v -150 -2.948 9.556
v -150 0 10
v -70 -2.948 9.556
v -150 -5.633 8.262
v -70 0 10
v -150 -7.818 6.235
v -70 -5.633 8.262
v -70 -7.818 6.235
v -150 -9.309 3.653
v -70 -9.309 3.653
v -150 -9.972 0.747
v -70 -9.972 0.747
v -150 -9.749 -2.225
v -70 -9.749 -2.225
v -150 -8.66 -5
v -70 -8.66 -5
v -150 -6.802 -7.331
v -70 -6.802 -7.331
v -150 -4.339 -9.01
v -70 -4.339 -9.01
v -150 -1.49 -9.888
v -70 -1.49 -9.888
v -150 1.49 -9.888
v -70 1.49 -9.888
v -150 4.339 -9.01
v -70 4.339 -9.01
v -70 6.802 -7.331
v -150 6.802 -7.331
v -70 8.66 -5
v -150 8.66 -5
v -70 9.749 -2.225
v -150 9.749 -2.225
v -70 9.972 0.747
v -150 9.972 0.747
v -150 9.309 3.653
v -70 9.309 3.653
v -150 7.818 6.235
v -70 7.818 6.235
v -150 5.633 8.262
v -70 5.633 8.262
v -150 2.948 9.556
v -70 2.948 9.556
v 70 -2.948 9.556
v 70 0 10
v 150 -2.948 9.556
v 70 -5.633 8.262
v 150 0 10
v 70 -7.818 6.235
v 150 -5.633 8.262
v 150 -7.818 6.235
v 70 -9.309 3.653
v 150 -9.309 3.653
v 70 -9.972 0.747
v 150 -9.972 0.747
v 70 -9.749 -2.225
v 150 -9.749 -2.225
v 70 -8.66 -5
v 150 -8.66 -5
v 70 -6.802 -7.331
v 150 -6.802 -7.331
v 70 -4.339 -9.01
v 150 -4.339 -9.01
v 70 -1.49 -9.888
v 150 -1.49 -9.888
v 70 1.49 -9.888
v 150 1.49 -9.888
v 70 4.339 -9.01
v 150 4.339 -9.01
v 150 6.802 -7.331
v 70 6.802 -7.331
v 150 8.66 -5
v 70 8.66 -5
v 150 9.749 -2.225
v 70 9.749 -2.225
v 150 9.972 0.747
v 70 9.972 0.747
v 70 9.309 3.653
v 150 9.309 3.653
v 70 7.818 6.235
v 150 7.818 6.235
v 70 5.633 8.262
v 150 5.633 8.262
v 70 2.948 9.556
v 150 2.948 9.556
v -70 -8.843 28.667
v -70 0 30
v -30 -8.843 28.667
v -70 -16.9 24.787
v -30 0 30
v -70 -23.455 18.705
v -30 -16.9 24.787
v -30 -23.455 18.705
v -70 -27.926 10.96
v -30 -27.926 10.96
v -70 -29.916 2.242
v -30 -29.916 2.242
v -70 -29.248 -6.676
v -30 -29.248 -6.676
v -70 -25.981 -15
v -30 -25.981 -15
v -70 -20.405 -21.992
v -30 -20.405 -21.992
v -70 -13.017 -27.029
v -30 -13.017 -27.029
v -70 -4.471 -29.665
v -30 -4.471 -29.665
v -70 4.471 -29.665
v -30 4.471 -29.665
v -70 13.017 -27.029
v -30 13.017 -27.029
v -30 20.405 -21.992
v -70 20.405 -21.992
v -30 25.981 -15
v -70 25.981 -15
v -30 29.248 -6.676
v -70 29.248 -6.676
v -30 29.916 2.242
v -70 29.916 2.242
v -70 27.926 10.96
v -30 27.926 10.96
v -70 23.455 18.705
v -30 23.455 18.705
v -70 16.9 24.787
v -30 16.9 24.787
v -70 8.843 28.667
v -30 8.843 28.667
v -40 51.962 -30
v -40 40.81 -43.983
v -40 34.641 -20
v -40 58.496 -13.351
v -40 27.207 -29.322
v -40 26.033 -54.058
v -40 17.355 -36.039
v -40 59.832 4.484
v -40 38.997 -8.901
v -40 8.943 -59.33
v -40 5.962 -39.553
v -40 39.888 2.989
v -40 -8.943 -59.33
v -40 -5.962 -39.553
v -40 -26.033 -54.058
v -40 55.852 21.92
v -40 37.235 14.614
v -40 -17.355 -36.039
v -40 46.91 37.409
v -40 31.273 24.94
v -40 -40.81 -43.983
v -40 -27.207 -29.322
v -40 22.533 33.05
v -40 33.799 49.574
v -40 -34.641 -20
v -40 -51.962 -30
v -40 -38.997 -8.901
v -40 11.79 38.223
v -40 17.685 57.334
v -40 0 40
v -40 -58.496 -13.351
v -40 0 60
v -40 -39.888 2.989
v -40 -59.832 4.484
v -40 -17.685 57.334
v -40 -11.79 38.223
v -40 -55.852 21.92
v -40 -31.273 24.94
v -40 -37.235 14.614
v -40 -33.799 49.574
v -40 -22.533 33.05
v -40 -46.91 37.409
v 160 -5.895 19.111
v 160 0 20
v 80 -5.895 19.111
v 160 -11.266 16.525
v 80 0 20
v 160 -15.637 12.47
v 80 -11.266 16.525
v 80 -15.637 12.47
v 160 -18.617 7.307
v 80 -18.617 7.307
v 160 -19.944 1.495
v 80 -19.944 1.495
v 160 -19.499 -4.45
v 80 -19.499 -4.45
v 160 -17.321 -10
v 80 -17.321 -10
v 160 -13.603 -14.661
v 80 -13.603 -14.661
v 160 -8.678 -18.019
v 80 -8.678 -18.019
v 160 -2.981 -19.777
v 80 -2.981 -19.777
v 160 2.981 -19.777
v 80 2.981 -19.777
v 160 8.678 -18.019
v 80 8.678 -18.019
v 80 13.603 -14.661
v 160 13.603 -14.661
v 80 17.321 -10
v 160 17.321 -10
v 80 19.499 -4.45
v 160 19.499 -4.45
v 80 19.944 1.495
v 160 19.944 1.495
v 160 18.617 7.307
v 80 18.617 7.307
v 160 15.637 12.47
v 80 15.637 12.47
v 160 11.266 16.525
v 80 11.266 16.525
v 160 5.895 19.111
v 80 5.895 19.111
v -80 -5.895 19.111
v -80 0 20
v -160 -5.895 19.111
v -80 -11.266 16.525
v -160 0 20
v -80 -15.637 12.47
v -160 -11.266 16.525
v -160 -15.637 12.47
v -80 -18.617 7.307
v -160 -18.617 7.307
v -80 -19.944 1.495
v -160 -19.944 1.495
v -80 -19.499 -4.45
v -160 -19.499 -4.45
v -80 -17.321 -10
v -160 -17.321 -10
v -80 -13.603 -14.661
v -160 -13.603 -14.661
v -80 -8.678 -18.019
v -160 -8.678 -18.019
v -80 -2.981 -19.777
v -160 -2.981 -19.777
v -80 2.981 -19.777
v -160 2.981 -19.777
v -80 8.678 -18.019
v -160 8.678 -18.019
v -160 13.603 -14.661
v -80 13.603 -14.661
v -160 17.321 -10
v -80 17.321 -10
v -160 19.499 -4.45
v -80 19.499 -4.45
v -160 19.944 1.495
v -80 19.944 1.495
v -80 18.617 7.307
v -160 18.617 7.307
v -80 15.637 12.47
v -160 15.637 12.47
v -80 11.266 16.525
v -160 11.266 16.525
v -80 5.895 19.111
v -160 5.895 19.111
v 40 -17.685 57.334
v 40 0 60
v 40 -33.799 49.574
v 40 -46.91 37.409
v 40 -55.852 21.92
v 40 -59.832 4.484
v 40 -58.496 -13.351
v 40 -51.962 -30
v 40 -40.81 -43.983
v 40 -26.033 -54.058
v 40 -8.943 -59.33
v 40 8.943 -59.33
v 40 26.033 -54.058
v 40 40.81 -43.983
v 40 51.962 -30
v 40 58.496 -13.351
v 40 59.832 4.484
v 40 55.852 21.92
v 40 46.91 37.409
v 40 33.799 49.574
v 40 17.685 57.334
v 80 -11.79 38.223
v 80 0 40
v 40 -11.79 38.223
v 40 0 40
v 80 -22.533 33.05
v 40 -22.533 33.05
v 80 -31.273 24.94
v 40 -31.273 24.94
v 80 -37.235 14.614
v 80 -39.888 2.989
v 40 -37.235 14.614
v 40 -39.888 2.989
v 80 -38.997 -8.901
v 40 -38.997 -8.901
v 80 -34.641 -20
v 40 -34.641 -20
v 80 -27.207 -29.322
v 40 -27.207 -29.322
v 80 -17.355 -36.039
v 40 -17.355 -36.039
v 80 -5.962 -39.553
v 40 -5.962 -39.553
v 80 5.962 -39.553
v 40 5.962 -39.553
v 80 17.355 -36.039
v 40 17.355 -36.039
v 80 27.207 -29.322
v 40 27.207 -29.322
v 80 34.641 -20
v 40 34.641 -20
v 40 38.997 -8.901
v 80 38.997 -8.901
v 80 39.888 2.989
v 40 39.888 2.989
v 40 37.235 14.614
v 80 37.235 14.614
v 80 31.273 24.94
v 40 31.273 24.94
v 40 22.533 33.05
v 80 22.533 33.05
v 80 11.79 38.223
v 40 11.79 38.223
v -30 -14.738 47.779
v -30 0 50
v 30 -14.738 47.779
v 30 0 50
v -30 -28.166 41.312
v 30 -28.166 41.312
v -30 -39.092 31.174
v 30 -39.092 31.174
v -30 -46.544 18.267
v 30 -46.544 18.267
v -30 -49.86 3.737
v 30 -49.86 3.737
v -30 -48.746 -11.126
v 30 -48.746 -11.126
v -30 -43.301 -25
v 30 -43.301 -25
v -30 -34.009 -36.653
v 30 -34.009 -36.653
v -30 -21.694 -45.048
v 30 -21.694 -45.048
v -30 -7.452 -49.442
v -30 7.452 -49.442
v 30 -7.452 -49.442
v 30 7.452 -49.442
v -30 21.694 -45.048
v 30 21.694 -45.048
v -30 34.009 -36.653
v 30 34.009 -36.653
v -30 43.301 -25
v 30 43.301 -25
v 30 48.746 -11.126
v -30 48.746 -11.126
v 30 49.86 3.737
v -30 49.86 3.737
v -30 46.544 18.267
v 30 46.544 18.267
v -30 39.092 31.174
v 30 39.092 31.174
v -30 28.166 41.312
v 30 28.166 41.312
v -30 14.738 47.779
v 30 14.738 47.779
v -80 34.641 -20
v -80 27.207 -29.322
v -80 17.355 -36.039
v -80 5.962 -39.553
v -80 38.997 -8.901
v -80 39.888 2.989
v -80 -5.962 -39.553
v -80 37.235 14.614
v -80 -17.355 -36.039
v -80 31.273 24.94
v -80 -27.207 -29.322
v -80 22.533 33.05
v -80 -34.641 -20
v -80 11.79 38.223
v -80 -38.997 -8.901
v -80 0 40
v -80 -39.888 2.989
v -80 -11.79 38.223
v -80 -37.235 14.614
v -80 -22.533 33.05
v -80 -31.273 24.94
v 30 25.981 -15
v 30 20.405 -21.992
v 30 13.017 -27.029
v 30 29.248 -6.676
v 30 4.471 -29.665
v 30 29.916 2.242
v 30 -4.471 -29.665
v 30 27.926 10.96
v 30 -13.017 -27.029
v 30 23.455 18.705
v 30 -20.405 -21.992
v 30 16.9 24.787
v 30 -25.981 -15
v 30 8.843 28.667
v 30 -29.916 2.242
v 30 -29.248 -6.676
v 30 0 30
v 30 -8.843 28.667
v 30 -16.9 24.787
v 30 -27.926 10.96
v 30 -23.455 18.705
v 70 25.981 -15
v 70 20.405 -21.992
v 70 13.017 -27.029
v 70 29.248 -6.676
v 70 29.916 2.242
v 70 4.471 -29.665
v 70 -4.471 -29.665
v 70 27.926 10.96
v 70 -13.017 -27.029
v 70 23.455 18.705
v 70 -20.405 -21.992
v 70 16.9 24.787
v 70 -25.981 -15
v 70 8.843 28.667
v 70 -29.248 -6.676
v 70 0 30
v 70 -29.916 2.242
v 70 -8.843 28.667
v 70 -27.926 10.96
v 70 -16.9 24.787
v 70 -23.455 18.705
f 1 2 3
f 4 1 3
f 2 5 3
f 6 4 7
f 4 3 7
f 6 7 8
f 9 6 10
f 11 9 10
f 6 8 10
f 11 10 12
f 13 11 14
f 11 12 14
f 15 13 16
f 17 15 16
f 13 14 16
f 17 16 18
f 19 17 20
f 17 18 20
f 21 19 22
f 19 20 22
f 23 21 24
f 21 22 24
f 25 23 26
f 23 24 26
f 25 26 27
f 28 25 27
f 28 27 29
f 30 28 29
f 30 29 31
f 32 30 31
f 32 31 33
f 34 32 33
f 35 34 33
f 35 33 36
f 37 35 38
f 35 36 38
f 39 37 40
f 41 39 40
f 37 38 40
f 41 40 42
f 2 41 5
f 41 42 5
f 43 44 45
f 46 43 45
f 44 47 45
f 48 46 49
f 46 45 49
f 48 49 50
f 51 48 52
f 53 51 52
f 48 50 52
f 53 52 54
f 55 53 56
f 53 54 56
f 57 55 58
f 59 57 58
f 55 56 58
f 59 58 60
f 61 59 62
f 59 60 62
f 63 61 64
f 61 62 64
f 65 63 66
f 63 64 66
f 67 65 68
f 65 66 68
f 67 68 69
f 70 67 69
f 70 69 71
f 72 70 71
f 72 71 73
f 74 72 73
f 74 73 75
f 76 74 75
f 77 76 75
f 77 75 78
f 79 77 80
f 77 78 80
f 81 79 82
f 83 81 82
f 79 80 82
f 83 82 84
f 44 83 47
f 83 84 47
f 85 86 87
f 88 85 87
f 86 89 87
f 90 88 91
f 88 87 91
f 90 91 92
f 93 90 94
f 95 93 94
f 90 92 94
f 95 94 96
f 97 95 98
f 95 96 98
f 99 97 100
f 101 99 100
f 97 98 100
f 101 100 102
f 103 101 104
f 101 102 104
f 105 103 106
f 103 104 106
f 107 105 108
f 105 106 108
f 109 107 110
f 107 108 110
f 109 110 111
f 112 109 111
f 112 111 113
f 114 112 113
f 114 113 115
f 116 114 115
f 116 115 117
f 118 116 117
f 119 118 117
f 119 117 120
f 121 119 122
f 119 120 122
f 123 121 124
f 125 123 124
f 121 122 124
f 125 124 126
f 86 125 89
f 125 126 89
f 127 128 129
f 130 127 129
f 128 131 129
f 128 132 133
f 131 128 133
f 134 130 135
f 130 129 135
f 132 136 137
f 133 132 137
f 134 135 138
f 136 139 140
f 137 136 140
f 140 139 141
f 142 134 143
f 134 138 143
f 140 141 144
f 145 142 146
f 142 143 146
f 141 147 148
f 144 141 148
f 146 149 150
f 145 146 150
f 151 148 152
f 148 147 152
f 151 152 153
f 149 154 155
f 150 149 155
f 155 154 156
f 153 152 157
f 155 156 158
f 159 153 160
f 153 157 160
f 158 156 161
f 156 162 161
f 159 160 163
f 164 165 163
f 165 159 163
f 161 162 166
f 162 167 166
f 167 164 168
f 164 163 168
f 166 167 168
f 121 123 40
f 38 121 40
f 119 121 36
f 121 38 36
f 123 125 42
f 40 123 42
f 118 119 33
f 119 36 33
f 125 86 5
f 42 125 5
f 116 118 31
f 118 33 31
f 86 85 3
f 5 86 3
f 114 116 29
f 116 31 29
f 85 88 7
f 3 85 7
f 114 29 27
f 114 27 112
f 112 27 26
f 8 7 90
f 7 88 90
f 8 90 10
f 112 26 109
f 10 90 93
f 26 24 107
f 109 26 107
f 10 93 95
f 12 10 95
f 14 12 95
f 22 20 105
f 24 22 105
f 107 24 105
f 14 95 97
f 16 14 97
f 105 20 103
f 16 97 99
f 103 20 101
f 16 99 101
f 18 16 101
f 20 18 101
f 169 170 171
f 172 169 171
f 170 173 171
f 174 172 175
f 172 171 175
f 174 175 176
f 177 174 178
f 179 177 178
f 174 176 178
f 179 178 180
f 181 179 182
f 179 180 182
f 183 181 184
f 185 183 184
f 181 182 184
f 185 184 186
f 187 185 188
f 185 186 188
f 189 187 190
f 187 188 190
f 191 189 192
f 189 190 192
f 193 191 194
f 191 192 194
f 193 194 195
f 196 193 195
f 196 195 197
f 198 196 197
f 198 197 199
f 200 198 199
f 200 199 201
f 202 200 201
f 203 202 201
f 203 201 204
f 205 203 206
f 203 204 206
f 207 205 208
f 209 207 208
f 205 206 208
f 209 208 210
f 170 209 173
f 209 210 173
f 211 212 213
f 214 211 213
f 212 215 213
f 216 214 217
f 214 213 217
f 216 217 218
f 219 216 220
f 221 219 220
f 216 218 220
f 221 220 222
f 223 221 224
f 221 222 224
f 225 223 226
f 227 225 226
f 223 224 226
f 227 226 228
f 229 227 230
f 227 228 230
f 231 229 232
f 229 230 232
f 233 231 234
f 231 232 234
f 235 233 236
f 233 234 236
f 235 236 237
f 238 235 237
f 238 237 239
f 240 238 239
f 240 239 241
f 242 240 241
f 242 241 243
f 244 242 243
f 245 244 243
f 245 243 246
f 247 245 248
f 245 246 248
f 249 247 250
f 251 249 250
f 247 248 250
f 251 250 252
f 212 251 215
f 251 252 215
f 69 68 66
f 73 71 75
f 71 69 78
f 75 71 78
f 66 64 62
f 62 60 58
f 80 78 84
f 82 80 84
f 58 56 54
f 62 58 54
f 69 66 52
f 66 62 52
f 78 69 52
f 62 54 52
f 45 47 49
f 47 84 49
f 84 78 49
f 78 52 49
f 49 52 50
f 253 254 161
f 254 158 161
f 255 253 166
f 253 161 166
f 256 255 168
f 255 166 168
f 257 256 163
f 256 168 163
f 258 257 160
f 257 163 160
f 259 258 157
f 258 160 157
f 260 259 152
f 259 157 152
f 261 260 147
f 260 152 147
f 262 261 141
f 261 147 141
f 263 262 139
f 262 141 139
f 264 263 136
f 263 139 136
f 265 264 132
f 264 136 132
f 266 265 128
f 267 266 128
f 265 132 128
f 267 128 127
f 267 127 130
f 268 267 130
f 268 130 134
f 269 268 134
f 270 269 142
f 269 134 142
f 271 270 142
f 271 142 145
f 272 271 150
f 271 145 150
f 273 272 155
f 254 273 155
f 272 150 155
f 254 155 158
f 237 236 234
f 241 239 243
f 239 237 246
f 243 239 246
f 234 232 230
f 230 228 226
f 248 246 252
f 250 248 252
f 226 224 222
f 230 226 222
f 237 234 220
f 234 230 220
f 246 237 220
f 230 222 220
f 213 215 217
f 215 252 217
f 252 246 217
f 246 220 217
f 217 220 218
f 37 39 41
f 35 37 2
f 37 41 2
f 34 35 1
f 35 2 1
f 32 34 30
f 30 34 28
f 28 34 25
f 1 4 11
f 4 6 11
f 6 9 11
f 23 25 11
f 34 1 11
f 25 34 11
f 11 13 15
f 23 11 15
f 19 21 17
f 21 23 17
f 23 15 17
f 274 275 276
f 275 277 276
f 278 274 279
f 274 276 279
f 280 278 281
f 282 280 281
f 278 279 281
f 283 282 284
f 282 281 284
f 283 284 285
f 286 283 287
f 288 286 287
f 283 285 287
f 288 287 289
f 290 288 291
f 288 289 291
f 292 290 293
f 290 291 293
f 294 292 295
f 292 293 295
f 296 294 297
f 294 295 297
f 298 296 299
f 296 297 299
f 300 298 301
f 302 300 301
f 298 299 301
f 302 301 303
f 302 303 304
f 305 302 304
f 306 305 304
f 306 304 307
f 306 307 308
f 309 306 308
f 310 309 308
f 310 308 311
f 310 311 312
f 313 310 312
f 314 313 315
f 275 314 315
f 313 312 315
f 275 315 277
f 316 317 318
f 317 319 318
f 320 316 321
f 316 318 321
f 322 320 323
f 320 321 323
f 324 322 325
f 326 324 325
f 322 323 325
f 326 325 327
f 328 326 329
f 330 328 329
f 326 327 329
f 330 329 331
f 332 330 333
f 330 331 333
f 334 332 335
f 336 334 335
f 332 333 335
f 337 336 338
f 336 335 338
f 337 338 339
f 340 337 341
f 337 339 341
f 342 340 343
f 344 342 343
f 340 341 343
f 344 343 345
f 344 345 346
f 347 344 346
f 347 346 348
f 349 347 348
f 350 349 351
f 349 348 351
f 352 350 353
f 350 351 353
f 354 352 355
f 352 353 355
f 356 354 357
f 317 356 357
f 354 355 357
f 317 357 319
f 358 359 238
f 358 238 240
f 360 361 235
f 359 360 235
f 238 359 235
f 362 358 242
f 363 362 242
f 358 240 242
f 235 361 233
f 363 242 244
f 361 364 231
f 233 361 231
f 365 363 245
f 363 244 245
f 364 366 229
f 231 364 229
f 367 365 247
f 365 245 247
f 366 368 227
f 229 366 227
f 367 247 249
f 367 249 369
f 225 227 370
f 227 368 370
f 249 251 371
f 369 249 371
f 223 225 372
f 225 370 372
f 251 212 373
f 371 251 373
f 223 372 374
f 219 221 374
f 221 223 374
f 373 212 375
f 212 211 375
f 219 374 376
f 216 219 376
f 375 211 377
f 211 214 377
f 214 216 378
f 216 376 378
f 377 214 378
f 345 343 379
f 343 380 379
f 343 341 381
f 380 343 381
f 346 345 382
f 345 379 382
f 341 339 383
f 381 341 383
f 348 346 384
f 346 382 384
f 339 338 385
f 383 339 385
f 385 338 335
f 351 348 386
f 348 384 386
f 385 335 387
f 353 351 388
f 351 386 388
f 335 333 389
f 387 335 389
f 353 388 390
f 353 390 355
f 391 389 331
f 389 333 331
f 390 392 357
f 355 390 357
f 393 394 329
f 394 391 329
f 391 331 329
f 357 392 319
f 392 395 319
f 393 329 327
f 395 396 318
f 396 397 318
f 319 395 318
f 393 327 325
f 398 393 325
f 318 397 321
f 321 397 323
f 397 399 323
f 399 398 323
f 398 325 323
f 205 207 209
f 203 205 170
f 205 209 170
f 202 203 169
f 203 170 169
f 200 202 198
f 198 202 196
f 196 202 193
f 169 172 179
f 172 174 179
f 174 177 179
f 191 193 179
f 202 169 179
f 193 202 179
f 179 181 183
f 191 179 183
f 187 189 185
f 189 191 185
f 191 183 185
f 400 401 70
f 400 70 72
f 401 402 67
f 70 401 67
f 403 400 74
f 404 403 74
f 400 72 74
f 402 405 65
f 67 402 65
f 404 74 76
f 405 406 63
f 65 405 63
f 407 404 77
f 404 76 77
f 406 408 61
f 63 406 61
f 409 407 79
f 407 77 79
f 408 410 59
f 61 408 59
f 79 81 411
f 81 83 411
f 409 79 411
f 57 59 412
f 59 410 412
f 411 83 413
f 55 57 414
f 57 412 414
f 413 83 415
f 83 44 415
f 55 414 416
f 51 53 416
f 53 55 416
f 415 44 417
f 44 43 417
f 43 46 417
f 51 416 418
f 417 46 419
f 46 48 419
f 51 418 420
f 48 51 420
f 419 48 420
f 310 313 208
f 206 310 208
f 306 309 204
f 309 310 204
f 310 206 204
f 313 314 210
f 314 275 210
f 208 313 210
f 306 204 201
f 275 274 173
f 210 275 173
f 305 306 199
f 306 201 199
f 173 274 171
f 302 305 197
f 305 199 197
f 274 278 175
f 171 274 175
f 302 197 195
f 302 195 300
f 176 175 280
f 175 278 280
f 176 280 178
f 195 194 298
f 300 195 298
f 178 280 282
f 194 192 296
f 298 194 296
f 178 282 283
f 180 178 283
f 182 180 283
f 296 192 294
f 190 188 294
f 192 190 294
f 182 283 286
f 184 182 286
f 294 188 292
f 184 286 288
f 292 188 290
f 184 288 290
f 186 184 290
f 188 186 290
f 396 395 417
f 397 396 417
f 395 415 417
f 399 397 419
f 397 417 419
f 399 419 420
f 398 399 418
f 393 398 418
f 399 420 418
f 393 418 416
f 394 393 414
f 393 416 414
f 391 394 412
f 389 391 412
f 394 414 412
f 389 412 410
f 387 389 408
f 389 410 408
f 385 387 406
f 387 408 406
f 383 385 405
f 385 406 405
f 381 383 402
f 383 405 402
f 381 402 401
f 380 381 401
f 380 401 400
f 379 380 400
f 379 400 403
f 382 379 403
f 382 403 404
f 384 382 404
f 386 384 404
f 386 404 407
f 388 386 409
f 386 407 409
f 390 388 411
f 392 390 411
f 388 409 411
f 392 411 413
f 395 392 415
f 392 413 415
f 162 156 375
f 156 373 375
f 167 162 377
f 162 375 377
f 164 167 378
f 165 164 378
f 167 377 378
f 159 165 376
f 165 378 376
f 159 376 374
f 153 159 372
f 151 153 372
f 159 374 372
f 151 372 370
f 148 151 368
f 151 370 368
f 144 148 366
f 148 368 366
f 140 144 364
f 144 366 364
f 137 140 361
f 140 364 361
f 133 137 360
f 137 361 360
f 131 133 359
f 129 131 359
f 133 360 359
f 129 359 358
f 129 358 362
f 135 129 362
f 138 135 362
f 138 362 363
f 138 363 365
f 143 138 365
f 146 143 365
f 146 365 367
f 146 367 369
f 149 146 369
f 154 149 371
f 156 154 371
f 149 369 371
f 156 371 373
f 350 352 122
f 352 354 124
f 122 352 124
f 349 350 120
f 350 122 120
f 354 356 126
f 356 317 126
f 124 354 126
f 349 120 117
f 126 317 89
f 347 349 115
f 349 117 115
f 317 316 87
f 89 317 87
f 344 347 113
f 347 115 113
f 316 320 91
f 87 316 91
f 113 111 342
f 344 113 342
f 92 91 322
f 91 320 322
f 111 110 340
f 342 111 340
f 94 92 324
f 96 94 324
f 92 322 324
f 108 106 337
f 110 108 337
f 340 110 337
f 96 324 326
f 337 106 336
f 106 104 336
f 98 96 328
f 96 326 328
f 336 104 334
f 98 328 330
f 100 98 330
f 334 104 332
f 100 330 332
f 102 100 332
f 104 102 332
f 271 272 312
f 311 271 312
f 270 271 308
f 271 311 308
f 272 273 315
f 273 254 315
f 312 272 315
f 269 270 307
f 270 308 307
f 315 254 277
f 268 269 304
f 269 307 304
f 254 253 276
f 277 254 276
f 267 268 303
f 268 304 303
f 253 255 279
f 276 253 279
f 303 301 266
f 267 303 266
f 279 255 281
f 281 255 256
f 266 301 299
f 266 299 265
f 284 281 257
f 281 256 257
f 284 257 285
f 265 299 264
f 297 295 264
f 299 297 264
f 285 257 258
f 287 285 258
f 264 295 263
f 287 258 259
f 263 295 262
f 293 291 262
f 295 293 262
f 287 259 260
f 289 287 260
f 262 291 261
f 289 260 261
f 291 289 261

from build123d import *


with BuildPart() as part:
    # Sketch2 → Revolve-Thin2 (revolve)
    with BuildSketch(Plane.XY, mode=Mode.PRIVATE) as revolve_thin2_sk:
        Polygon((-150, 0), (-150, 10), (-70, 10), (-70, 30), (-30, 30), (-30, 50), (30, 50), (30, 30), (70, 30), (70, 10), (150, 10), (150, 0), (160, 0), (160, 20), (80, 20), (80, 40), (40, 40), (40, 60), (-40, 60), (-40, 40), (-80, 40), (-80, 20), (-160, 20), (-160, 0), align=None)
    revolve(revolve_thin2_sk.sketch.rotate(Axis((-150, 0, 0), (1, 0, 0)), 90), axis=Axis((-150, 0, 0), (1, 0, 0)))  # turned: the seam where the file's is


solid = part.part
